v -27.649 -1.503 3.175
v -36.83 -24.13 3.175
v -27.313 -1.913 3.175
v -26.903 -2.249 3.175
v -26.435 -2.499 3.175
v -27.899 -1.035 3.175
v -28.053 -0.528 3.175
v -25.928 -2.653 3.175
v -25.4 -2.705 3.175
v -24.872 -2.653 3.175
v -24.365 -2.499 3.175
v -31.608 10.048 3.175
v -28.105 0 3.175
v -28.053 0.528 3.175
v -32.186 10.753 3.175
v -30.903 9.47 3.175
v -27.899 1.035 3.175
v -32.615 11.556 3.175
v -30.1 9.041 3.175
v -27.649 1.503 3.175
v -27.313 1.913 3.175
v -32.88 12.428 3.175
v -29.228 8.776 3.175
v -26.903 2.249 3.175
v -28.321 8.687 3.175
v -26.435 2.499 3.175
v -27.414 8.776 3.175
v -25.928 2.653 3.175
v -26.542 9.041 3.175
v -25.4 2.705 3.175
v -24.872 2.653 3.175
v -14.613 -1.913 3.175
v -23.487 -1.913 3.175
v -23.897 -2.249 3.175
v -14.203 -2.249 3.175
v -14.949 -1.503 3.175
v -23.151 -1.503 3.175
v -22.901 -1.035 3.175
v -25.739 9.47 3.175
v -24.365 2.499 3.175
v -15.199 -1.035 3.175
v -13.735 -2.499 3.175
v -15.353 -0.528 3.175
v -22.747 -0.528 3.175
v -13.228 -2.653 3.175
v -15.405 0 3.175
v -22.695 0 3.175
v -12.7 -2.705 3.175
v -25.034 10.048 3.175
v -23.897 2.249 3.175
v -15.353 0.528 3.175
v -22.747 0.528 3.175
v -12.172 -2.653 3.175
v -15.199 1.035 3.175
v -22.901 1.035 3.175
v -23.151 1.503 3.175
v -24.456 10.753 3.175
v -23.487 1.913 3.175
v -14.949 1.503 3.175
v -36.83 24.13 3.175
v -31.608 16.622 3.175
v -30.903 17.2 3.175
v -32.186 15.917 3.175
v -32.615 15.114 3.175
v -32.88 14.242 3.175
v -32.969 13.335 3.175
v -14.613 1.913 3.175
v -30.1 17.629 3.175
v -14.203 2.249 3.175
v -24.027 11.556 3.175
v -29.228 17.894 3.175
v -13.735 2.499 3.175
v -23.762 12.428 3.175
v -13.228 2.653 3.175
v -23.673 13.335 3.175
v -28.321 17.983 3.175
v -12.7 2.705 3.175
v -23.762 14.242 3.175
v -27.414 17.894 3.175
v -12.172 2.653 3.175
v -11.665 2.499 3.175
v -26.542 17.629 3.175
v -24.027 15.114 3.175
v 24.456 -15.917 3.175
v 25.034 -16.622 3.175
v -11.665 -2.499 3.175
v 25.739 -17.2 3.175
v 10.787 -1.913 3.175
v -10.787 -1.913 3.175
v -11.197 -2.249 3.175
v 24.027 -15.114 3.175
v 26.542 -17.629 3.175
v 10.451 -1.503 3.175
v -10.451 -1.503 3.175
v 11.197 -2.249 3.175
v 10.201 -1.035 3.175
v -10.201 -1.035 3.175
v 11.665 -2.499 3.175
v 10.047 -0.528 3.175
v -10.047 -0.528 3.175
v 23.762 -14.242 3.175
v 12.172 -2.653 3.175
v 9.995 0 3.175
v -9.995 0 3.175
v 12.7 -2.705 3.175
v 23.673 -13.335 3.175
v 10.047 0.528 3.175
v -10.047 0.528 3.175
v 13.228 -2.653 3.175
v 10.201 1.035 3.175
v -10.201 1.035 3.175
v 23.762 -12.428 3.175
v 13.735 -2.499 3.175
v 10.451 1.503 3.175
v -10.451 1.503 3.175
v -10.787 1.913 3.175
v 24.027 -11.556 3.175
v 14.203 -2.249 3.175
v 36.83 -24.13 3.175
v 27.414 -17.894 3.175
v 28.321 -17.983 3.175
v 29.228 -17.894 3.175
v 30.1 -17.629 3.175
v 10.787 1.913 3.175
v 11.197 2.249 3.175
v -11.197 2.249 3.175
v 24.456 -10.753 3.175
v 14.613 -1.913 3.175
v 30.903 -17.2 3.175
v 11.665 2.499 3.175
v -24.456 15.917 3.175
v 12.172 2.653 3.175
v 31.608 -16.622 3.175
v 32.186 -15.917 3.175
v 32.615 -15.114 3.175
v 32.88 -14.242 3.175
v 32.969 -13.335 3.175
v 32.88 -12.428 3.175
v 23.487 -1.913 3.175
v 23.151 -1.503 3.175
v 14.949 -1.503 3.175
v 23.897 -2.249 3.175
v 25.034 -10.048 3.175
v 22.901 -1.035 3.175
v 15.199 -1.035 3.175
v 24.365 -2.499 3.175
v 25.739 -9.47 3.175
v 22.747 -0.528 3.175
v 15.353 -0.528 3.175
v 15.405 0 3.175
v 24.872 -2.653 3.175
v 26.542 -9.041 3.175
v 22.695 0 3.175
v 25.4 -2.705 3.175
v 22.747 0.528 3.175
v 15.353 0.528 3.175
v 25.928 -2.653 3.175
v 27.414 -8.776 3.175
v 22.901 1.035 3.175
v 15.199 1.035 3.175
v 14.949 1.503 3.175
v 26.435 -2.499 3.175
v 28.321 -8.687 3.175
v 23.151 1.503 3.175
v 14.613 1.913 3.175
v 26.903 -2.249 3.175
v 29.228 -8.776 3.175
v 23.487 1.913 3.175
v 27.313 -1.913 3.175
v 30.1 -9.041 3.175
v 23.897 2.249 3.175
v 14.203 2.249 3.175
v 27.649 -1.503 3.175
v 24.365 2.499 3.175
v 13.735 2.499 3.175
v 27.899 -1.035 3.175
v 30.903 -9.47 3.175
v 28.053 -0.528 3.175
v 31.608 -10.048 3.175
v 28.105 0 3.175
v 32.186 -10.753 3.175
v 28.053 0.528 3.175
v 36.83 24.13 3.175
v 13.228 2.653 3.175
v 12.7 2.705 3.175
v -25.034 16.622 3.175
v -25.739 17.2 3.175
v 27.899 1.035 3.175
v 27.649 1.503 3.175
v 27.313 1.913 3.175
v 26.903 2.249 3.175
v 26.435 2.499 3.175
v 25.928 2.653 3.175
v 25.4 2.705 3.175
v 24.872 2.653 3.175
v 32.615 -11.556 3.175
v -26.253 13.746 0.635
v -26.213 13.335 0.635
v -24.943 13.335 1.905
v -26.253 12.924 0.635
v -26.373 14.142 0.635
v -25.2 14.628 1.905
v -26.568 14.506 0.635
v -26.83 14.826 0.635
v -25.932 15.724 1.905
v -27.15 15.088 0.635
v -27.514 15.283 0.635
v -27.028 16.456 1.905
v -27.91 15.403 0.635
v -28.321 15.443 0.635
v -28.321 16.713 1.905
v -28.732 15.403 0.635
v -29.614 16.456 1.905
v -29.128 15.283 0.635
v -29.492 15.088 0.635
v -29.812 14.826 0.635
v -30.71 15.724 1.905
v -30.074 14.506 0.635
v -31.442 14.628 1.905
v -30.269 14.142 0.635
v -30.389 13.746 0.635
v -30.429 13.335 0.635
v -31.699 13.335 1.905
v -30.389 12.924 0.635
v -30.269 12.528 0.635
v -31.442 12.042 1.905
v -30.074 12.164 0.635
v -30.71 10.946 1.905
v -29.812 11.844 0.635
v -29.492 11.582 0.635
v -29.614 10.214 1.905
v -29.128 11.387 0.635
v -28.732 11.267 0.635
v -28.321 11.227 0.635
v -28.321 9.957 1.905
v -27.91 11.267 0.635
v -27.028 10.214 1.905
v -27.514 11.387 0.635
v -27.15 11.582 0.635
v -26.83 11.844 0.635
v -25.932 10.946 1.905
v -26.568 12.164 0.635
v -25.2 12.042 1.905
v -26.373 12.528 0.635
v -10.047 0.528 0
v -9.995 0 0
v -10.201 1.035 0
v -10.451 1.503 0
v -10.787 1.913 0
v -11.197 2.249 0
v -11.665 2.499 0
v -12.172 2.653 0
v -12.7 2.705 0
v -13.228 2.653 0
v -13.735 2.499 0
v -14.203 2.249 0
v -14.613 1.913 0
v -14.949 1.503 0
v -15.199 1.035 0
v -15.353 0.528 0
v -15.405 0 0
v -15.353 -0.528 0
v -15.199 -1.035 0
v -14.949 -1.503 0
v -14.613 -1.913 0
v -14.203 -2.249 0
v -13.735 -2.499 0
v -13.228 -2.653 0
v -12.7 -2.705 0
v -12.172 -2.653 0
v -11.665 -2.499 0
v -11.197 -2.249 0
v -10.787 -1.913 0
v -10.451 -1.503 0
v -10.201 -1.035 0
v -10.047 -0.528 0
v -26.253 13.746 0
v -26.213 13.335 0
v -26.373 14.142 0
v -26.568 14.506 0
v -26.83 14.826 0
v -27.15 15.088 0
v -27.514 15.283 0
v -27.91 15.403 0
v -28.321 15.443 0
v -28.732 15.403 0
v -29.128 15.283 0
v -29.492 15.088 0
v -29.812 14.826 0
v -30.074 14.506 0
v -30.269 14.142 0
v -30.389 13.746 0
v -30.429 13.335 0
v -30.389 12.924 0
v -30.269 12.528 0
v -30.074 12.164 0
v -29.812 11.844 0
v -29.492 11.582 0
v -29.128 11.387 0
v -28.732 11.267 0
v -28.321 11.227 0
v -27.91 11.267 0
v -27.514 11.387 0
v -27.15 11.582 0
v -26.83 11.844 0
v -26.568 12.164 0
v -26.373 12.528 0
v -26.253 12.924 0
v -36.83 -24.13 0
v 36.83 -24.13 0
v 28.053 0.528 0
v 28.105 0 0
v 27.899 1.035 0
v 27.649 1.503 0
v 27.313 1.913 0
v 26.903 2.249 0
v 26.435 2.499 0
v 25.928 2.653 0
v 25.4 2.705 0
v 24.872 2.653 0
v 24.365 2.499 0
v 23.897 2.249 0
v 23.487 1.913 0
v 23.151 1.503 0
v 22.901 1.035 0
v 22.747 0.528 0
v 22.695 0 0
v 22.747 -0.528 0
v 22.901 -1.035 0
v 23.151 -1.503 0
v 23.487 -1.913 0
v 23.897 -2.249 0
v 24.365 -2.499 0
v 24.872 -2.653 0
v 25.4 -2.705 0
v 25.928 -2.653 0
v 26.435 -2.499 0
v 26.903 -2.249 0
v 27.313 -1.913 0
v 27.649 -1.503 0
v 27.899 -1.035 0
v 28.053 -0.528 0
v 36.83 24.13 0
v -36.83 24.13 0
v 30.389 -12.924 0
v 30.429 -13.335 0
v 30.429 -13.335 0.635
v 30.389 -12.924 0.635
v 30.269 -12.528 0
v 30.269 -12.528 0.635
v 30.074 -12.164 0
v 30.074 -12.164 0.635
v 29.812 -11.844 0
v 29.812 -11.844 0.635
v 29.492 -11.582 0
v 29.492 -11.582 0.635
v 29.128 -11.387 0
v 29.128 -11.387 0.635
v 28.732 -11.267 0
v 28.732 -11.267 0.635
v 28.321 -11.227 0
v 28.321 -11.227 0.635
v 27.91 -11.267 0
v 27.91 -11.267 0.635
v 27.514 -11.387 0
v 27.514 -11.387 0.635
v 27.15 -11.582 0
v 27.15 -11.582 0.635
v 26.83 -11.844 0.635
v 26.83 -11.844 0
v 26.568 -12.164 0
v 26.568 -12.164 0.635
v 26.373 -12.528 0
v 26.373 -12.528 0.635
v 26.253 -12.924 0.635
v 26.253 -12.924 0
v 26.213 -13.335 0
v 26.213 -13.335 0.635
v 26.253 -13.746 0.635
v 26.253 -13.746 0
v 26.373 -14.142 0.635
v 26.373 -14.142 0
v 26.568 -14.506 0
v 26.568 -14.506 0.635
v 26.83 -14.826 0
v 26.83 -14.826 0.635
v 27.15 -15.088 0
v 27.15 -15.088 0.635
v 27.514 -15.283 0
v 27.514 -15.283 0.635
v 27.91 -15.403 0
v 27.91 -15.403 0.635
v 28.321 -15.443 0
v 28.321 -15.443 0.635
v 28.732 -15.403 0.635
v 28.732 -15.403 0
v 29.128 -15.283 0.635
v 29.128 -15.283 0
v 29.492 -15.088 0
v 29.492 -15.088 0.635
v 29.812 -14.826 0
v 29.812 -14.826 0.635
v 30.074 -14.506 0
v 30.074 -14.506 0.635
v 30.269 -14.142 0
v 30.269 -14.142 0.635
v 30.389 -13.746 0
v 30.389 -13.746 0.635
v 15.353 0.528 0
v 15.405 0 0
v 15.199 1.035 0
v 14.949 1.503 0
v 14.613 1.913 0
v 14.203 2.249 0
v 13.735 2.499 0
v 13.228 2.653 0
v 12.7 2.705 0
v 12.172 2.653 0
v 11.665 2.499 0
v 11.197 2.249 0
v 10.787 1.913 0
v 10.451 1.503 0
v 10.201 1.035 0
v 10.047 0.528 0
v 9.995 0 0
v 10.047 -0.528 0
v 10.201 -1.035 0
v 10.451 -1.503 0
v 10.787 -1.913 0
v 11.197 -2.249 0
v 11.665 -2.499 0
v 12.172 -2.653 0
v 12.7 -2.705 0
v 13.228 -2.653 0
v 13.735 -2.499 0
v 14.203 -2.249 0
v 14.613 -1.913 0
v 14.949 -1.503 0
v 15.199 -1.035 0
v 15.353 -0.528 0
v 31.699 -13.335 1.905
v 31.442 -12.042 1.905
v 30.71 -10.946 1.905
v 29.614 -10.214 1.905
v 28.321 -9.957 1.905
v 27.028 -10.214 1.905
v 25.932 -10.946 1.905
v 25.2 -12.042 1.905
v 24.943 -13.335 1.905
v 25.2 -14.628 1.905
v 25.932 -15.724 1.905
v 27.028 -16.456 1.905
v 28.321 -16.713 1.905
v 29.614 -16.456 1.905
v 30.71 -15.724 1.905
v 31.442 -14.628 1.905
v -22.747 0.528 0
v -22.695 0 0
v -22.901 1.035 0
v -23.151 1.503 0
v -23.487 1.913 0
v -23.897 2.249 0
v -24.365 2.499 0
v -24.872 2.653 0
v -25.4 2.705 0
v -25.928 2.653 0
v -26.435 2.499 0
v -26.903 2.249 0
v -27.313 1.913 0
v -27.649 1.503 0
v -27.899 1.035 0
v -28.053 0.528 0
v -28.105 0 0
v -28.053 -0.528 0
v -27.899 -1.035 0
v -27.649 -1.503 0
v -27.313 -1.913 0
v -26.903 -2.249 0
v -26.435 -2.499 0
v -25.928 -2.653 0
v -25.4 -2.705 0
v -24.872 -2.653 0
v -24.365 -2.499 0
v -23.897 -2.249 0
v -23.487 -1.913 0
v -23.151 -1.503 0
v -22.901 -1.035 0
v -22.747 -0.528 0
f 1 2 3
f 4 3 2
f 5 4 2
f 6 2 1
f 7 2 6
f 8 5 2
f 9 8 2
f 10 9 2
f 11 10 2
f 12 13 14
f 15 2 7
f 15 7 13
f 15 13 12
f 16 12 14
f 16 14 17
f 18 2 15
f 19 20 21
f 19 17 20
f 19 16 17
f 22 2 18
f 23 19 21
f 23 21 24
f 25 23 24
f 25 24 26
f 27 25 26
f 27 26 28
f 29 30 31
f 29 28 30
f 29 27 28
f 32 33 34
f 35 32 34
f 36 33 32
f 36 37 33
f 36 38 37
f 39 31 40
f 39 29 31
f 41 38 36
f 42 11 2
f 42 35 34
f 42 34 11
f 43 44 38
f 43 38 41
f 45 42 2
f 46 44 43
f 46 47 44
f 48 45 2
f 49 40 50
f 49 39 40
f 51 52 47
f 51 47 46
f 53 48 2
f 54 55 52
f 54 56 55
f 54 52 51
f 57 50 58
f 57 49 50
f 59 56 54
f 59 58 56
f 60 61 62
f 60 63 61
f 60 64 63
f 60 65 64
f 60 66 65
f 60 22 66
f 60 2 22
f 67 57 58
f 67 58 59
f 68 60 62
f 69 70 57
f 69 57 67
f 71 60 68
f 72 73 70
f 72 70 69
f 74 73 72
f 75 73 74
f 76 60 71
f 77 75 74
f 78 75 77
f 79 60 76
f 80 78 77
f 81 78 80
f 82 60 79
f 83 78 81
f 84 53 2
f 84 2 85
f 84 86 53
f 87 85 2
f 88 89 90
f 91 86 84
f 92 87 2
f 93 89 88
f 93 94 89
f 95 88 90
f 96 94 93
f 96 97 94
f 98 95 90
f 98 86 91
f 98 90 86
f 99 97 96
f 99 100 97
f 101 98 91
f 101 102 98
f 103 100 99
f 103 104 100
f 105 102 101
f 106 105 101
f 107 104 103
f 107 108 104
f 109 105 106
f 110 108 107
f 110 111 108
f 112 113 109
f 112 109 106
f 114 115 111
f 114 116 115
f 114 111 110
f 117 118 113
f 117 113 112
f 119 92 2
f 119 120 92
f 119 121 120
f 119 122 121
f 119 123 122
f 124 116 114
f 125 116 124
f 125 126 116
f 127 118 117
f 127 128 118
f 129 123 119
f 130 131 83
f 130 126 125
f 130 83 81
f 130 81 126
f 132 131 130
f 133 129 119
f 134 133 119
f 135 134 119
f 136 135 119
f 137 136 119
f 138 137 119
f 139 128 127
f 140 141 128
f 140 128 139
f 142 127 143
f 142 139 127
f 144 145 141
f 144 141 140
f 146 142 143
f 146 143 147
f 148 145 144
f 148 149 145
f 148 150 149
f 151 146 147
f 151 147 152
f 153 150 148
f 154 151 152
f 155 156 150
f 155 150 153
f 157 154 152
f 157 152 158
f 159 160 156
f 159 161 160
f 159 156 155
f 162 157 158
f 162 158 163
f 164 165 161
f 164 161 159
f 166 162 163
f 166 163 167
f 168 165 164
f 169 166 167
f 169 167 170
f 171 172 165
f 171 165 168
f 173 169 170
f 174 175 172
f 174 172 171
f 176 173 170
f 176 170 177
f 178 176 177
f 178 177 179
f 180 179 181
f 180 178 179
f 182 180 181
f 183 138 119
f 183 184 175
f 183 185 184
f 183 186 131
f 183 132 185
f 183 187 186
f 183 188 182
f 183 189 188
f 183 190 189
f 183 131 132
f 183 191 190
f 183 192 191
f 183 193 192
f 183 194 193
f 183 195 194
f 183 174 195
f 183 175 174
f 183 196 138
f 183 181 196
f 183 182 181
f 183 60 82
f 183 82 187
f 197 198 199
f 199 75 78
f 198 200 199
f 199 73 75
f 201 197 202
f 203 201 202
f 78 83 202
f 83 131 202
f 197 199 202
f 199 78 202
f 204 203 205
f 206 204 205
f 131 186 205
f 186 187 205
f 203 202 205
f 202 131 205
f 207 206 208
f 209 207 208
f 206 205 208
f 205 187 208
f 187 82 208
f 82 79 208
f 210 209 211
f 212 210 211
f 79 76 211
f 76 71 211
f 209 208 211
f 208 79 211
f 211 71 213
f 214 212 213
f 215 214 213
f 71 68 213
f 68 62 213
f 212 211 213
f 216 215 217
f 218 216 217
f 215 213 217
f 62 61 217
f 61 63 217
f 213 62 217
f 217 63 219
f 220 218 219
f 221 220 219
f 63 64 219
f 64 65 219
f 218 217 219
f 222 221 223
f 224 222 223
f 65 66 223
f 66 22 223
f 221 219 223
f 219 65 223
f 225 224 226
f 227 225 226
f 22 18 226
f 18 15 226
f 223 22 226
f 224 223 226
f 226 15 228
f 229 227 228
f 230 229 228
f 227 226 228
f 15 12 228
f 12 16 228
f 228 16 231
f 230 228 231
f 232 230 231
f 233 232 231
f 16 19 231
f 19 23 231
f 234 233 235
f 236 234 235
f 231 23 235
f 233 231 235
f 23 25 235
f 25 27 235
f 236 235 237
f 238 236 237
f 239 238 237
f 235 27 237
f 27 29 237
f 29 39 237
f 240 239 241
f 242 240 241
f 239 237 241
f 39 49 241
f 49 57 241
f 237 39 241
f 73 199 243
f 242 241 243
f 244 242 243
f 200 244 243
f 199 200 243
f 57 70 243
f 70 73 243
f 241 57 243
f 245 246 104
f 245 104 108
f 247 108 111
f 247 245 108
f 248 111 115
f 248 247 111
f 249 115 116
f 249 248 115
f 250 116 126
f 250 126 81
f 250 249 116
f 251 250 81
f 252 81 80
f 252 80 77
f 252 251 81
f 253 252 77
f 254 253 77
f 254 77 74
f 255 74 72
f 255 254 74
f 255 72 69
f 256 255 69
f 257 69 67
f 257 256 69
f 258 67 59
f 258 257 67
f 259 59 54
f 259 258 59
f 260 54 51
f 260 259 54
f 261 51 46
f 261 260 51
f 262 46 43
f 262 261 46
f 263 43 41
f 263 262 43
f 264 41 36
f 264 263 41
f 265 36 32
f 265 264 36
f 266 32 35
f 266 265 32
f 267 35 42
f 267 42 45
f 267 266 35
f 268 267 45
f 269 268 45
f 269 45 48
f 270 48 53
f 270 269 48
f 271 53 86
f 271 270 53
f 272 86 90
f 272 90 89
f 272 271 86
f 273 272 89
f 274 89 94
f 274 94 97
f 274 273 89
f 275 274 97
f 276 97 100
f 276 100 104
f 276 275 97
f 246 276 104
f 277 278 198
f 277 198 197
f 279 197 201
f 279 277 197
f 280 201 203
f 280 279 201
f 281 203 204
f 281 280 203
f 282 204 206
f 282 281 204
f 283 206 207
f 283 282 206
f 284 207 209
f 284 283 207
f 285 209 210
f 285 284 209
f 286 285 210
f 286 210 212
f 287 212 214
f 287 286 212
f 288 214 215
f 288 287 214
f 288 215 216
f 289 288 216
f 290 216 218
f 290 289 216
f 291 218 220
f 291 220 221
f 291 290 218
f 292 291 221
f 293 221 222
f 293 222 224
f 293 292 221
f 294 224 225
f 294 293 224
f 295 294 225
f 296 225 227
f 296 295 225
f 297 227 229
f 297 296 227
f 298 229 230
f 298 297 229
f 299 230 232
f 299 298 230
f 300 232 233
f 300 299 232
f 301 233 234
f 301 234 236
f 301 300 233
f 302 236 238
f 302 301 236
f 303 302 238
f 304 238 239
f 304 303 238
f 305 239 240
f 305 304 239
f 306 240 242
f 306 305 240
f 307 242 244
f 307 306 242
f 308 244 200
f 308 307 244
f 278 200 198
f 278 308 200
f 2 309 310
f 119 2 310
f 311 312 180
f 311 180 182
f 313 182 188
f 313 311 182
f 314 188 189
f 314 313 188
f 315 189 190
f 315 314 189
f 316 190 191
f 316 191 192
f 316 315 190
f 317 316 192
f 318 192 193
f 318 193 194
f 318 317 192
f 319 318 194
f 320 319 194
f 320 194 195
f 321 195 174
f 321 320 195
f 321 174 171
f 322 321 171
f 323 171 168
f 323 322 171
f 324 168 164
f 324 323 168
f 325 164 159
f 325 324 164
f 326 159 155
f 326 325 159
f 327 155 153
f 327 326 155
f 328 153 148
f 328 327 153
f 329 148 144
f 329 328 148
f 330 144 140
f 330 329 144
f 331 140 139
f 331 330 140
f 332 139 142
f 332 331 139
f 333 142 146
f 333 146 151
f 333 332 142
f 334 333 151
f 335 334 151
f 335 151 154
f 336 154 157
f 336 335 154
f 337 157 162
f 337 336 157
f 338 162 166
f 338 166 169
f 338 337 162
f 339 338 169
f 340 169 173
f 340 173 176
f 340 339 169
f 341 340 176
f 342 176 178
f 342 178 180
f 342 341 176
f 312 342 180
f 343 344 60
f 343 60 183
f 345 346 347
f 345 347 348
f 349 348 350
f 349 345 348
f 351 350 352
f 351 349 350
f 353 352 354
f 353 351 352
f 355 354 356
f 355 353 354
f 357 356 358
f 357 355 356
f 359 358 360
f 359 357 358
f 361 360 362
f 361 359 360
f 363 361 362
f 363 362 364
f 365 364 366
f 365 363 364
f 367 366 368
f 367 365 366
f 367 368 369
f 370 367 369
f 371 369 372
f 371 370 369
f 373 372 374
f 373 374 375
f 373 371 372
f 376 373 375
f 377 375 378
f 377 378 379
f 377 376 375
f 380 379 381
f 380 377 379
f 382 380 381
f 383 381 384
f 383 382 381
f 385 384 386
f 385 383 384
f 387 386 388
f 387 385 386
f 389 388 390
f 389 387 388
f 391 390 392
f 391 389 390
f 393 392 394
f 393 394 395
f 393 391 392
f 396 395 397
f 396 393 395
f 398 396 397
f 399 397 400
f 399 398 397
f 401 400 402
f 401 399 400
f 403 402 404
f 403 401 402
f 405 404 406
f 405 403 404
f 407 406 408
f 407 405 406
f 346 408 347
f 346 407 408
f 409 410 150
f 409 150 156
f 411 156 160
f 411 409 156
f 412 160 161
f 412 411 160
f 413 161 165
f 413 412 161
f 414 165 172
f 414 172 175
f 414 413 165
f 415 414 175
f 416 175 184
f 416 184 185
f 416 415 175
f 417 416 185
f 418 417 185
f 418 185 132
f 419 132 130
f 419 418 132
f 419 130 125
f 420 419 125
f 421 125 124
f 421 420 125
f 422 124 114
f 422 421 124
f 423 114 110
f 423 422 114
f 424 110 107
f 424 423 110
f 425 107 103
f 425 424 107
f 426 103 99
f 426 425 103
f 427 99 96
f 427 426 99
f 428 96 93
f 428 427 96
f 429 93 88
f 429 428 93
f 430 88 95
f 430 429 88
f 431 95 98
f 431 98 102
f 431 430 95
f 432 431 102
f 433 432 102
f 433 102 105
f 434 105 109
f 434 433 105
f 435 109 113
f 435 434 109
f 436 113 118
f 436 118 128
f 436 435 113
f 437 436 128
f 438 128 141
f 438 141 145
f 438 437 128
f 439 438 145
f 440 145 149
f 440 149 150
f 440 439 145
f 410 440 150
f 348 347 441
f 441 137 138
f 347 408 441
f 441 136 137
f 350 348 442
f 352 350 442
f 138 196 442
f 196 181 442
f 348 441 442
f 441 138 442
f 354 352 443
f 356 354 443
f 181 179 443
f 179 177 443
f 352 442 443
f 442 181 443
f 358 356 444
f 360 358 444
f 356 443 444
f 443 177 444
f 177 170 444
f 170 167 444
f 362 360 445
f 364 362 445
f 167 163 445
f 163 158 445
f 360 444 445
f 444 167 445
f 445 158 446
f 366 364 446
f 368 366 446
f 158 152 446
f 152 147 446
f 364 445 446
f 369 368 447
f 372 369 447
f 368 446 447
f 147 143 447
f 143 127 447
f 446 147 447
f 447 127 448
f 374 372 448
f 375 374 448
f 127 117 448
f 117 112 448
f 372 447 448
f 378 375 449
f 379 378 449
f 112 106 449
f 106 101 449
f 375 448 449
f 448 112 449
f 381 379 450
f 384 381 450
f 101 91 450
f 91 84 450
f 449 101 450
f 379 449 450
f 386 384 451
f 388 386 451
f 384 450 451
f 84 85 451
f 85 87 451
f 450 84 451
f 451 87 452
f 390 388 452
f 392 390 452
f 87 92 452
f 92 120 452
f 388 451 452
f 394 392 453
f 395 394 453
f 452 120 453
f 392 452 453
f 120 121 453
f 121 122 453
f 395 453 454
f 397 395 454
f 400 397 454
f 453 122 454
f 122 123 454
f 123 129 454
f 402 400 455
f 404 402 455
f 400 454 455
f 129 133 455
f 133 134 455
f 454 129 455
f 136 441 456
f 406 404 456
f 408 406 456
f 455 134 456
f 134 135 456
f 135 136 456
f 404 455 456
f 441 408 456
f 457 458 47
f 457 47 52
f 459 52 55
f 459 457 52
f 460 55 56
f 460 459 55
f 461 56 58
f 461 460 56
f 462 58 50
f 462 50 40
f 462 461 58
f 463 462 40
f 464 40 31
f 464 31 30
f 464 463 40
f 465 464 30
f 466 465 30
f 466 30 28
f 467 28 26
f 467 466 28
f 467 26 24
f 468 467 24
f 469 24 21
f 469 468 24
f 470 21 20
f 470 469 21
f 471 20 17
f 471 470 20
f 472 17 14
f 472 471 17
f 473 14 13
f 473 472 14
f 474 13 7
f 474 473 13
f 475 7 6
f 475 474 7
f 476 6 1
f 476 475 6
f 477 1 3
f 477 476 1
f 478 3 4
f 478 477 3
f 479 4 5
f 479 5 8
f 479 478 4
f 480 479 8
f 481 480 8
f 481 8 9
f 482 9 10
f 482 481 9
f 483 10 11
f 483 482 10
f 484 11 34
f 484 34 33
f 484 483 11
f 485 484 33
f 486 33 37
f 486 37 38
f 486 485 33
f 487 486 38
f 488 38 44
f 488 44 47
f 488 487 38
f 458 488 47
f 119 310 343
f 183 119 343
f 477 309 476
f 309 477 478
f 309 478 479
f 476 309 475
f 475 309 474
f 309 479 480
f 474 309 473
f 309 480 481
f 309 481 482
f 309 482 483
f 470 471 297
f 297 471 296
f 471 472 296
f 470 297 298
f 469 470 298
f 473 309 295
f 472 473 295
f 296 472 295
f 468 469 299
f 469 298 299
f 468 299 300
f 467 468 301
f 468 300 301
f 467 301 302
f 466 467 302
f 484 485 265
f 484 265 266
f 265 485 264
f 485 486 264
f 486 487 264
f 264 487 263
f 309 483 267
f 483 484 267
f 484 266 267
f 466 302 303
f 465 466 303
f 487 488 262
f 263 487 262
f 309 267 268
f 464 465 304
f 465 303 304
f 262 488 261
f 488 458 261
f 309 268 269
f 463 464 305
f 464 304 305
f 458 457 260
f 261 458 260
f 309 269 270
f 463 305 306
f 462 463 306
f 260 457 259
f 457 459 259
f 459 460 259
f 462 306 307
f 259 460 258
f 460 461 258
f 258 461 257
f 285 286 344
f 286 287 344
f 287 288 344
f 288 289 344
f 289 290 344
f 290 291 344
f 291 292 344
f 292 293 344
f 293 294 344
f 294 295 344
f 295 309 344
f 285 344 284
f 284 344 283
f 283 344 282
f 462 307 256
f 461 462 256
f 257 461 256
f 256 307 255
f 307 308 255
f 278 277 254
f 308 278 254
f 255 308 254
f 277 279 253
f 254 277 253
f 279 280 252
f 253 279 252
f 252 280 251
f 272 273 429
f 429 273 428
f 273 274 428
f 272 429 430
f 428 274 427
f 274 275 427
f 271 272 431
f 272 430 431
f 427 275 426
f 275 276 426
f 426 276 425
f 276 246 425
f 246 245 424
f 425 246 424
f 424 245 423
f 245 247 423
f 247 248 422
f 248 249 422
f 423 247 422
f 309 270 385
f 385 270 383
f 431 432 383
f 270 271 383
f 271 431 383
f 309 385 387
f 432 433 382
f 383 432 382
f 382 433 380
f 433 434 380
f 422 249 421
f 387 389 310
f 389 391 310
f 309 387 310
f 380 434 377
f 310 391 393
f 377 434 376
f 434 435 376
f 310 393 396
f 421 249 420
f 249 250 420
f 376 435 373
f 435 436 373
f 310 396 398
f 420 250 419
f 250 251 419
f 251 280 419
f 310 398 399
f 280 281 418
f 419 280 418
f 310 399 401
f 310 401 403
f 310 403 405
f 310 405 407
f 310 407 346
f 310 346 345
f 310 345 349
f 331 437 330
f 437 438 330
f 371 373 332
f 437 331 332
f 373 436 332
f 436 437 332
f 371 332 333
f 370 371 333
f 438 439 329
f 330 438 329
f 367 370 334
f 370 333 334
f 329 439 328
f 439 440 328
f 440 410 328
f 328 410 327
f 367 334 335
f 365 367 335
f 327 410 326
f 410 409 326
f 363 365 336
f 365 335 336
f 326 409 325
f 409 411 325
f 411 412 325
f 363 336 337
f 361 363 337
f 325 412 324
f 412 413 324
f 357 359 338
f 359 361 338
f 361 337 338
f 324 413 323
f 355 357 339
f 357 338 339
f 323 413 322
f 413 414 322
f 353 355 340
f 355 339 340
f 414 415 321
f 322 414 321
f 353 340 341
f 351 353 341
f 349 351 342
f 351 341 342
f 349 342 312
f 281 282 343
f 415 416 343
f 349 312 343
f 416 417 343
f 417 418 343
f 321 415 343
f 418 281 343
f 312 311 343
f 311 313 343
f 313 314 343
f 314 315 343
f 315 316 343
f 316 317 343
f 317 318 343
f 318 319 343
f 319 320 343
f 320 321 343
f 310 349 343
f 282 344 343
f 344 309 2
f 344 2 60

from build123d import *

# Parameters (mm, degrees)
F0_W     = 73.66
F0_H     = 48.26
F0_R     = 2.1082
F0_R_2   = 2.7051
F1_DEPTH = 3.175
F2_SIZE  = 2.54


with BuildPart() as f1:
    # F0 (on Top) → F1 (new body)
    with BuildSketch(Plane.XY):
        Rectangle(F0_W, F0_H)
        with Locations((28.321, -13.335)):
            Circle(F0_R, mode=Mode.SUBTRACT)
        with Locations((-25.4, 0)):
            Circle(F0_R_2, mode=Mode.SUBTRACT)
        with Locations((-12.7, 0)):
            Circle(F0_R_2, mode=Mode.SUBTRACT)
        with Locations((-28.321, 13.335)):
            Circle(F0_R, mode=Mode.SUBTRACT)
        with Locations((12.7, 0)):
            Circle(F0_R_2, mode=Mode.SUBTRACT)
        with Locations((25.4, 0)):
            Circle(F0_R_2, mode=Mode.SUBTRACT)
    extrude(amount=F1_DEPTH)

    # F2
    f2_edges = [f1.edges().sort_by_distance(p)[0] for p in [
        (-30.4292, 13.335, 3.175),
        (26.2128, -13.335, 3.175),
    ]]
    chamfer(f2_edges, length=F2_SIZE)


solid = f1.part
